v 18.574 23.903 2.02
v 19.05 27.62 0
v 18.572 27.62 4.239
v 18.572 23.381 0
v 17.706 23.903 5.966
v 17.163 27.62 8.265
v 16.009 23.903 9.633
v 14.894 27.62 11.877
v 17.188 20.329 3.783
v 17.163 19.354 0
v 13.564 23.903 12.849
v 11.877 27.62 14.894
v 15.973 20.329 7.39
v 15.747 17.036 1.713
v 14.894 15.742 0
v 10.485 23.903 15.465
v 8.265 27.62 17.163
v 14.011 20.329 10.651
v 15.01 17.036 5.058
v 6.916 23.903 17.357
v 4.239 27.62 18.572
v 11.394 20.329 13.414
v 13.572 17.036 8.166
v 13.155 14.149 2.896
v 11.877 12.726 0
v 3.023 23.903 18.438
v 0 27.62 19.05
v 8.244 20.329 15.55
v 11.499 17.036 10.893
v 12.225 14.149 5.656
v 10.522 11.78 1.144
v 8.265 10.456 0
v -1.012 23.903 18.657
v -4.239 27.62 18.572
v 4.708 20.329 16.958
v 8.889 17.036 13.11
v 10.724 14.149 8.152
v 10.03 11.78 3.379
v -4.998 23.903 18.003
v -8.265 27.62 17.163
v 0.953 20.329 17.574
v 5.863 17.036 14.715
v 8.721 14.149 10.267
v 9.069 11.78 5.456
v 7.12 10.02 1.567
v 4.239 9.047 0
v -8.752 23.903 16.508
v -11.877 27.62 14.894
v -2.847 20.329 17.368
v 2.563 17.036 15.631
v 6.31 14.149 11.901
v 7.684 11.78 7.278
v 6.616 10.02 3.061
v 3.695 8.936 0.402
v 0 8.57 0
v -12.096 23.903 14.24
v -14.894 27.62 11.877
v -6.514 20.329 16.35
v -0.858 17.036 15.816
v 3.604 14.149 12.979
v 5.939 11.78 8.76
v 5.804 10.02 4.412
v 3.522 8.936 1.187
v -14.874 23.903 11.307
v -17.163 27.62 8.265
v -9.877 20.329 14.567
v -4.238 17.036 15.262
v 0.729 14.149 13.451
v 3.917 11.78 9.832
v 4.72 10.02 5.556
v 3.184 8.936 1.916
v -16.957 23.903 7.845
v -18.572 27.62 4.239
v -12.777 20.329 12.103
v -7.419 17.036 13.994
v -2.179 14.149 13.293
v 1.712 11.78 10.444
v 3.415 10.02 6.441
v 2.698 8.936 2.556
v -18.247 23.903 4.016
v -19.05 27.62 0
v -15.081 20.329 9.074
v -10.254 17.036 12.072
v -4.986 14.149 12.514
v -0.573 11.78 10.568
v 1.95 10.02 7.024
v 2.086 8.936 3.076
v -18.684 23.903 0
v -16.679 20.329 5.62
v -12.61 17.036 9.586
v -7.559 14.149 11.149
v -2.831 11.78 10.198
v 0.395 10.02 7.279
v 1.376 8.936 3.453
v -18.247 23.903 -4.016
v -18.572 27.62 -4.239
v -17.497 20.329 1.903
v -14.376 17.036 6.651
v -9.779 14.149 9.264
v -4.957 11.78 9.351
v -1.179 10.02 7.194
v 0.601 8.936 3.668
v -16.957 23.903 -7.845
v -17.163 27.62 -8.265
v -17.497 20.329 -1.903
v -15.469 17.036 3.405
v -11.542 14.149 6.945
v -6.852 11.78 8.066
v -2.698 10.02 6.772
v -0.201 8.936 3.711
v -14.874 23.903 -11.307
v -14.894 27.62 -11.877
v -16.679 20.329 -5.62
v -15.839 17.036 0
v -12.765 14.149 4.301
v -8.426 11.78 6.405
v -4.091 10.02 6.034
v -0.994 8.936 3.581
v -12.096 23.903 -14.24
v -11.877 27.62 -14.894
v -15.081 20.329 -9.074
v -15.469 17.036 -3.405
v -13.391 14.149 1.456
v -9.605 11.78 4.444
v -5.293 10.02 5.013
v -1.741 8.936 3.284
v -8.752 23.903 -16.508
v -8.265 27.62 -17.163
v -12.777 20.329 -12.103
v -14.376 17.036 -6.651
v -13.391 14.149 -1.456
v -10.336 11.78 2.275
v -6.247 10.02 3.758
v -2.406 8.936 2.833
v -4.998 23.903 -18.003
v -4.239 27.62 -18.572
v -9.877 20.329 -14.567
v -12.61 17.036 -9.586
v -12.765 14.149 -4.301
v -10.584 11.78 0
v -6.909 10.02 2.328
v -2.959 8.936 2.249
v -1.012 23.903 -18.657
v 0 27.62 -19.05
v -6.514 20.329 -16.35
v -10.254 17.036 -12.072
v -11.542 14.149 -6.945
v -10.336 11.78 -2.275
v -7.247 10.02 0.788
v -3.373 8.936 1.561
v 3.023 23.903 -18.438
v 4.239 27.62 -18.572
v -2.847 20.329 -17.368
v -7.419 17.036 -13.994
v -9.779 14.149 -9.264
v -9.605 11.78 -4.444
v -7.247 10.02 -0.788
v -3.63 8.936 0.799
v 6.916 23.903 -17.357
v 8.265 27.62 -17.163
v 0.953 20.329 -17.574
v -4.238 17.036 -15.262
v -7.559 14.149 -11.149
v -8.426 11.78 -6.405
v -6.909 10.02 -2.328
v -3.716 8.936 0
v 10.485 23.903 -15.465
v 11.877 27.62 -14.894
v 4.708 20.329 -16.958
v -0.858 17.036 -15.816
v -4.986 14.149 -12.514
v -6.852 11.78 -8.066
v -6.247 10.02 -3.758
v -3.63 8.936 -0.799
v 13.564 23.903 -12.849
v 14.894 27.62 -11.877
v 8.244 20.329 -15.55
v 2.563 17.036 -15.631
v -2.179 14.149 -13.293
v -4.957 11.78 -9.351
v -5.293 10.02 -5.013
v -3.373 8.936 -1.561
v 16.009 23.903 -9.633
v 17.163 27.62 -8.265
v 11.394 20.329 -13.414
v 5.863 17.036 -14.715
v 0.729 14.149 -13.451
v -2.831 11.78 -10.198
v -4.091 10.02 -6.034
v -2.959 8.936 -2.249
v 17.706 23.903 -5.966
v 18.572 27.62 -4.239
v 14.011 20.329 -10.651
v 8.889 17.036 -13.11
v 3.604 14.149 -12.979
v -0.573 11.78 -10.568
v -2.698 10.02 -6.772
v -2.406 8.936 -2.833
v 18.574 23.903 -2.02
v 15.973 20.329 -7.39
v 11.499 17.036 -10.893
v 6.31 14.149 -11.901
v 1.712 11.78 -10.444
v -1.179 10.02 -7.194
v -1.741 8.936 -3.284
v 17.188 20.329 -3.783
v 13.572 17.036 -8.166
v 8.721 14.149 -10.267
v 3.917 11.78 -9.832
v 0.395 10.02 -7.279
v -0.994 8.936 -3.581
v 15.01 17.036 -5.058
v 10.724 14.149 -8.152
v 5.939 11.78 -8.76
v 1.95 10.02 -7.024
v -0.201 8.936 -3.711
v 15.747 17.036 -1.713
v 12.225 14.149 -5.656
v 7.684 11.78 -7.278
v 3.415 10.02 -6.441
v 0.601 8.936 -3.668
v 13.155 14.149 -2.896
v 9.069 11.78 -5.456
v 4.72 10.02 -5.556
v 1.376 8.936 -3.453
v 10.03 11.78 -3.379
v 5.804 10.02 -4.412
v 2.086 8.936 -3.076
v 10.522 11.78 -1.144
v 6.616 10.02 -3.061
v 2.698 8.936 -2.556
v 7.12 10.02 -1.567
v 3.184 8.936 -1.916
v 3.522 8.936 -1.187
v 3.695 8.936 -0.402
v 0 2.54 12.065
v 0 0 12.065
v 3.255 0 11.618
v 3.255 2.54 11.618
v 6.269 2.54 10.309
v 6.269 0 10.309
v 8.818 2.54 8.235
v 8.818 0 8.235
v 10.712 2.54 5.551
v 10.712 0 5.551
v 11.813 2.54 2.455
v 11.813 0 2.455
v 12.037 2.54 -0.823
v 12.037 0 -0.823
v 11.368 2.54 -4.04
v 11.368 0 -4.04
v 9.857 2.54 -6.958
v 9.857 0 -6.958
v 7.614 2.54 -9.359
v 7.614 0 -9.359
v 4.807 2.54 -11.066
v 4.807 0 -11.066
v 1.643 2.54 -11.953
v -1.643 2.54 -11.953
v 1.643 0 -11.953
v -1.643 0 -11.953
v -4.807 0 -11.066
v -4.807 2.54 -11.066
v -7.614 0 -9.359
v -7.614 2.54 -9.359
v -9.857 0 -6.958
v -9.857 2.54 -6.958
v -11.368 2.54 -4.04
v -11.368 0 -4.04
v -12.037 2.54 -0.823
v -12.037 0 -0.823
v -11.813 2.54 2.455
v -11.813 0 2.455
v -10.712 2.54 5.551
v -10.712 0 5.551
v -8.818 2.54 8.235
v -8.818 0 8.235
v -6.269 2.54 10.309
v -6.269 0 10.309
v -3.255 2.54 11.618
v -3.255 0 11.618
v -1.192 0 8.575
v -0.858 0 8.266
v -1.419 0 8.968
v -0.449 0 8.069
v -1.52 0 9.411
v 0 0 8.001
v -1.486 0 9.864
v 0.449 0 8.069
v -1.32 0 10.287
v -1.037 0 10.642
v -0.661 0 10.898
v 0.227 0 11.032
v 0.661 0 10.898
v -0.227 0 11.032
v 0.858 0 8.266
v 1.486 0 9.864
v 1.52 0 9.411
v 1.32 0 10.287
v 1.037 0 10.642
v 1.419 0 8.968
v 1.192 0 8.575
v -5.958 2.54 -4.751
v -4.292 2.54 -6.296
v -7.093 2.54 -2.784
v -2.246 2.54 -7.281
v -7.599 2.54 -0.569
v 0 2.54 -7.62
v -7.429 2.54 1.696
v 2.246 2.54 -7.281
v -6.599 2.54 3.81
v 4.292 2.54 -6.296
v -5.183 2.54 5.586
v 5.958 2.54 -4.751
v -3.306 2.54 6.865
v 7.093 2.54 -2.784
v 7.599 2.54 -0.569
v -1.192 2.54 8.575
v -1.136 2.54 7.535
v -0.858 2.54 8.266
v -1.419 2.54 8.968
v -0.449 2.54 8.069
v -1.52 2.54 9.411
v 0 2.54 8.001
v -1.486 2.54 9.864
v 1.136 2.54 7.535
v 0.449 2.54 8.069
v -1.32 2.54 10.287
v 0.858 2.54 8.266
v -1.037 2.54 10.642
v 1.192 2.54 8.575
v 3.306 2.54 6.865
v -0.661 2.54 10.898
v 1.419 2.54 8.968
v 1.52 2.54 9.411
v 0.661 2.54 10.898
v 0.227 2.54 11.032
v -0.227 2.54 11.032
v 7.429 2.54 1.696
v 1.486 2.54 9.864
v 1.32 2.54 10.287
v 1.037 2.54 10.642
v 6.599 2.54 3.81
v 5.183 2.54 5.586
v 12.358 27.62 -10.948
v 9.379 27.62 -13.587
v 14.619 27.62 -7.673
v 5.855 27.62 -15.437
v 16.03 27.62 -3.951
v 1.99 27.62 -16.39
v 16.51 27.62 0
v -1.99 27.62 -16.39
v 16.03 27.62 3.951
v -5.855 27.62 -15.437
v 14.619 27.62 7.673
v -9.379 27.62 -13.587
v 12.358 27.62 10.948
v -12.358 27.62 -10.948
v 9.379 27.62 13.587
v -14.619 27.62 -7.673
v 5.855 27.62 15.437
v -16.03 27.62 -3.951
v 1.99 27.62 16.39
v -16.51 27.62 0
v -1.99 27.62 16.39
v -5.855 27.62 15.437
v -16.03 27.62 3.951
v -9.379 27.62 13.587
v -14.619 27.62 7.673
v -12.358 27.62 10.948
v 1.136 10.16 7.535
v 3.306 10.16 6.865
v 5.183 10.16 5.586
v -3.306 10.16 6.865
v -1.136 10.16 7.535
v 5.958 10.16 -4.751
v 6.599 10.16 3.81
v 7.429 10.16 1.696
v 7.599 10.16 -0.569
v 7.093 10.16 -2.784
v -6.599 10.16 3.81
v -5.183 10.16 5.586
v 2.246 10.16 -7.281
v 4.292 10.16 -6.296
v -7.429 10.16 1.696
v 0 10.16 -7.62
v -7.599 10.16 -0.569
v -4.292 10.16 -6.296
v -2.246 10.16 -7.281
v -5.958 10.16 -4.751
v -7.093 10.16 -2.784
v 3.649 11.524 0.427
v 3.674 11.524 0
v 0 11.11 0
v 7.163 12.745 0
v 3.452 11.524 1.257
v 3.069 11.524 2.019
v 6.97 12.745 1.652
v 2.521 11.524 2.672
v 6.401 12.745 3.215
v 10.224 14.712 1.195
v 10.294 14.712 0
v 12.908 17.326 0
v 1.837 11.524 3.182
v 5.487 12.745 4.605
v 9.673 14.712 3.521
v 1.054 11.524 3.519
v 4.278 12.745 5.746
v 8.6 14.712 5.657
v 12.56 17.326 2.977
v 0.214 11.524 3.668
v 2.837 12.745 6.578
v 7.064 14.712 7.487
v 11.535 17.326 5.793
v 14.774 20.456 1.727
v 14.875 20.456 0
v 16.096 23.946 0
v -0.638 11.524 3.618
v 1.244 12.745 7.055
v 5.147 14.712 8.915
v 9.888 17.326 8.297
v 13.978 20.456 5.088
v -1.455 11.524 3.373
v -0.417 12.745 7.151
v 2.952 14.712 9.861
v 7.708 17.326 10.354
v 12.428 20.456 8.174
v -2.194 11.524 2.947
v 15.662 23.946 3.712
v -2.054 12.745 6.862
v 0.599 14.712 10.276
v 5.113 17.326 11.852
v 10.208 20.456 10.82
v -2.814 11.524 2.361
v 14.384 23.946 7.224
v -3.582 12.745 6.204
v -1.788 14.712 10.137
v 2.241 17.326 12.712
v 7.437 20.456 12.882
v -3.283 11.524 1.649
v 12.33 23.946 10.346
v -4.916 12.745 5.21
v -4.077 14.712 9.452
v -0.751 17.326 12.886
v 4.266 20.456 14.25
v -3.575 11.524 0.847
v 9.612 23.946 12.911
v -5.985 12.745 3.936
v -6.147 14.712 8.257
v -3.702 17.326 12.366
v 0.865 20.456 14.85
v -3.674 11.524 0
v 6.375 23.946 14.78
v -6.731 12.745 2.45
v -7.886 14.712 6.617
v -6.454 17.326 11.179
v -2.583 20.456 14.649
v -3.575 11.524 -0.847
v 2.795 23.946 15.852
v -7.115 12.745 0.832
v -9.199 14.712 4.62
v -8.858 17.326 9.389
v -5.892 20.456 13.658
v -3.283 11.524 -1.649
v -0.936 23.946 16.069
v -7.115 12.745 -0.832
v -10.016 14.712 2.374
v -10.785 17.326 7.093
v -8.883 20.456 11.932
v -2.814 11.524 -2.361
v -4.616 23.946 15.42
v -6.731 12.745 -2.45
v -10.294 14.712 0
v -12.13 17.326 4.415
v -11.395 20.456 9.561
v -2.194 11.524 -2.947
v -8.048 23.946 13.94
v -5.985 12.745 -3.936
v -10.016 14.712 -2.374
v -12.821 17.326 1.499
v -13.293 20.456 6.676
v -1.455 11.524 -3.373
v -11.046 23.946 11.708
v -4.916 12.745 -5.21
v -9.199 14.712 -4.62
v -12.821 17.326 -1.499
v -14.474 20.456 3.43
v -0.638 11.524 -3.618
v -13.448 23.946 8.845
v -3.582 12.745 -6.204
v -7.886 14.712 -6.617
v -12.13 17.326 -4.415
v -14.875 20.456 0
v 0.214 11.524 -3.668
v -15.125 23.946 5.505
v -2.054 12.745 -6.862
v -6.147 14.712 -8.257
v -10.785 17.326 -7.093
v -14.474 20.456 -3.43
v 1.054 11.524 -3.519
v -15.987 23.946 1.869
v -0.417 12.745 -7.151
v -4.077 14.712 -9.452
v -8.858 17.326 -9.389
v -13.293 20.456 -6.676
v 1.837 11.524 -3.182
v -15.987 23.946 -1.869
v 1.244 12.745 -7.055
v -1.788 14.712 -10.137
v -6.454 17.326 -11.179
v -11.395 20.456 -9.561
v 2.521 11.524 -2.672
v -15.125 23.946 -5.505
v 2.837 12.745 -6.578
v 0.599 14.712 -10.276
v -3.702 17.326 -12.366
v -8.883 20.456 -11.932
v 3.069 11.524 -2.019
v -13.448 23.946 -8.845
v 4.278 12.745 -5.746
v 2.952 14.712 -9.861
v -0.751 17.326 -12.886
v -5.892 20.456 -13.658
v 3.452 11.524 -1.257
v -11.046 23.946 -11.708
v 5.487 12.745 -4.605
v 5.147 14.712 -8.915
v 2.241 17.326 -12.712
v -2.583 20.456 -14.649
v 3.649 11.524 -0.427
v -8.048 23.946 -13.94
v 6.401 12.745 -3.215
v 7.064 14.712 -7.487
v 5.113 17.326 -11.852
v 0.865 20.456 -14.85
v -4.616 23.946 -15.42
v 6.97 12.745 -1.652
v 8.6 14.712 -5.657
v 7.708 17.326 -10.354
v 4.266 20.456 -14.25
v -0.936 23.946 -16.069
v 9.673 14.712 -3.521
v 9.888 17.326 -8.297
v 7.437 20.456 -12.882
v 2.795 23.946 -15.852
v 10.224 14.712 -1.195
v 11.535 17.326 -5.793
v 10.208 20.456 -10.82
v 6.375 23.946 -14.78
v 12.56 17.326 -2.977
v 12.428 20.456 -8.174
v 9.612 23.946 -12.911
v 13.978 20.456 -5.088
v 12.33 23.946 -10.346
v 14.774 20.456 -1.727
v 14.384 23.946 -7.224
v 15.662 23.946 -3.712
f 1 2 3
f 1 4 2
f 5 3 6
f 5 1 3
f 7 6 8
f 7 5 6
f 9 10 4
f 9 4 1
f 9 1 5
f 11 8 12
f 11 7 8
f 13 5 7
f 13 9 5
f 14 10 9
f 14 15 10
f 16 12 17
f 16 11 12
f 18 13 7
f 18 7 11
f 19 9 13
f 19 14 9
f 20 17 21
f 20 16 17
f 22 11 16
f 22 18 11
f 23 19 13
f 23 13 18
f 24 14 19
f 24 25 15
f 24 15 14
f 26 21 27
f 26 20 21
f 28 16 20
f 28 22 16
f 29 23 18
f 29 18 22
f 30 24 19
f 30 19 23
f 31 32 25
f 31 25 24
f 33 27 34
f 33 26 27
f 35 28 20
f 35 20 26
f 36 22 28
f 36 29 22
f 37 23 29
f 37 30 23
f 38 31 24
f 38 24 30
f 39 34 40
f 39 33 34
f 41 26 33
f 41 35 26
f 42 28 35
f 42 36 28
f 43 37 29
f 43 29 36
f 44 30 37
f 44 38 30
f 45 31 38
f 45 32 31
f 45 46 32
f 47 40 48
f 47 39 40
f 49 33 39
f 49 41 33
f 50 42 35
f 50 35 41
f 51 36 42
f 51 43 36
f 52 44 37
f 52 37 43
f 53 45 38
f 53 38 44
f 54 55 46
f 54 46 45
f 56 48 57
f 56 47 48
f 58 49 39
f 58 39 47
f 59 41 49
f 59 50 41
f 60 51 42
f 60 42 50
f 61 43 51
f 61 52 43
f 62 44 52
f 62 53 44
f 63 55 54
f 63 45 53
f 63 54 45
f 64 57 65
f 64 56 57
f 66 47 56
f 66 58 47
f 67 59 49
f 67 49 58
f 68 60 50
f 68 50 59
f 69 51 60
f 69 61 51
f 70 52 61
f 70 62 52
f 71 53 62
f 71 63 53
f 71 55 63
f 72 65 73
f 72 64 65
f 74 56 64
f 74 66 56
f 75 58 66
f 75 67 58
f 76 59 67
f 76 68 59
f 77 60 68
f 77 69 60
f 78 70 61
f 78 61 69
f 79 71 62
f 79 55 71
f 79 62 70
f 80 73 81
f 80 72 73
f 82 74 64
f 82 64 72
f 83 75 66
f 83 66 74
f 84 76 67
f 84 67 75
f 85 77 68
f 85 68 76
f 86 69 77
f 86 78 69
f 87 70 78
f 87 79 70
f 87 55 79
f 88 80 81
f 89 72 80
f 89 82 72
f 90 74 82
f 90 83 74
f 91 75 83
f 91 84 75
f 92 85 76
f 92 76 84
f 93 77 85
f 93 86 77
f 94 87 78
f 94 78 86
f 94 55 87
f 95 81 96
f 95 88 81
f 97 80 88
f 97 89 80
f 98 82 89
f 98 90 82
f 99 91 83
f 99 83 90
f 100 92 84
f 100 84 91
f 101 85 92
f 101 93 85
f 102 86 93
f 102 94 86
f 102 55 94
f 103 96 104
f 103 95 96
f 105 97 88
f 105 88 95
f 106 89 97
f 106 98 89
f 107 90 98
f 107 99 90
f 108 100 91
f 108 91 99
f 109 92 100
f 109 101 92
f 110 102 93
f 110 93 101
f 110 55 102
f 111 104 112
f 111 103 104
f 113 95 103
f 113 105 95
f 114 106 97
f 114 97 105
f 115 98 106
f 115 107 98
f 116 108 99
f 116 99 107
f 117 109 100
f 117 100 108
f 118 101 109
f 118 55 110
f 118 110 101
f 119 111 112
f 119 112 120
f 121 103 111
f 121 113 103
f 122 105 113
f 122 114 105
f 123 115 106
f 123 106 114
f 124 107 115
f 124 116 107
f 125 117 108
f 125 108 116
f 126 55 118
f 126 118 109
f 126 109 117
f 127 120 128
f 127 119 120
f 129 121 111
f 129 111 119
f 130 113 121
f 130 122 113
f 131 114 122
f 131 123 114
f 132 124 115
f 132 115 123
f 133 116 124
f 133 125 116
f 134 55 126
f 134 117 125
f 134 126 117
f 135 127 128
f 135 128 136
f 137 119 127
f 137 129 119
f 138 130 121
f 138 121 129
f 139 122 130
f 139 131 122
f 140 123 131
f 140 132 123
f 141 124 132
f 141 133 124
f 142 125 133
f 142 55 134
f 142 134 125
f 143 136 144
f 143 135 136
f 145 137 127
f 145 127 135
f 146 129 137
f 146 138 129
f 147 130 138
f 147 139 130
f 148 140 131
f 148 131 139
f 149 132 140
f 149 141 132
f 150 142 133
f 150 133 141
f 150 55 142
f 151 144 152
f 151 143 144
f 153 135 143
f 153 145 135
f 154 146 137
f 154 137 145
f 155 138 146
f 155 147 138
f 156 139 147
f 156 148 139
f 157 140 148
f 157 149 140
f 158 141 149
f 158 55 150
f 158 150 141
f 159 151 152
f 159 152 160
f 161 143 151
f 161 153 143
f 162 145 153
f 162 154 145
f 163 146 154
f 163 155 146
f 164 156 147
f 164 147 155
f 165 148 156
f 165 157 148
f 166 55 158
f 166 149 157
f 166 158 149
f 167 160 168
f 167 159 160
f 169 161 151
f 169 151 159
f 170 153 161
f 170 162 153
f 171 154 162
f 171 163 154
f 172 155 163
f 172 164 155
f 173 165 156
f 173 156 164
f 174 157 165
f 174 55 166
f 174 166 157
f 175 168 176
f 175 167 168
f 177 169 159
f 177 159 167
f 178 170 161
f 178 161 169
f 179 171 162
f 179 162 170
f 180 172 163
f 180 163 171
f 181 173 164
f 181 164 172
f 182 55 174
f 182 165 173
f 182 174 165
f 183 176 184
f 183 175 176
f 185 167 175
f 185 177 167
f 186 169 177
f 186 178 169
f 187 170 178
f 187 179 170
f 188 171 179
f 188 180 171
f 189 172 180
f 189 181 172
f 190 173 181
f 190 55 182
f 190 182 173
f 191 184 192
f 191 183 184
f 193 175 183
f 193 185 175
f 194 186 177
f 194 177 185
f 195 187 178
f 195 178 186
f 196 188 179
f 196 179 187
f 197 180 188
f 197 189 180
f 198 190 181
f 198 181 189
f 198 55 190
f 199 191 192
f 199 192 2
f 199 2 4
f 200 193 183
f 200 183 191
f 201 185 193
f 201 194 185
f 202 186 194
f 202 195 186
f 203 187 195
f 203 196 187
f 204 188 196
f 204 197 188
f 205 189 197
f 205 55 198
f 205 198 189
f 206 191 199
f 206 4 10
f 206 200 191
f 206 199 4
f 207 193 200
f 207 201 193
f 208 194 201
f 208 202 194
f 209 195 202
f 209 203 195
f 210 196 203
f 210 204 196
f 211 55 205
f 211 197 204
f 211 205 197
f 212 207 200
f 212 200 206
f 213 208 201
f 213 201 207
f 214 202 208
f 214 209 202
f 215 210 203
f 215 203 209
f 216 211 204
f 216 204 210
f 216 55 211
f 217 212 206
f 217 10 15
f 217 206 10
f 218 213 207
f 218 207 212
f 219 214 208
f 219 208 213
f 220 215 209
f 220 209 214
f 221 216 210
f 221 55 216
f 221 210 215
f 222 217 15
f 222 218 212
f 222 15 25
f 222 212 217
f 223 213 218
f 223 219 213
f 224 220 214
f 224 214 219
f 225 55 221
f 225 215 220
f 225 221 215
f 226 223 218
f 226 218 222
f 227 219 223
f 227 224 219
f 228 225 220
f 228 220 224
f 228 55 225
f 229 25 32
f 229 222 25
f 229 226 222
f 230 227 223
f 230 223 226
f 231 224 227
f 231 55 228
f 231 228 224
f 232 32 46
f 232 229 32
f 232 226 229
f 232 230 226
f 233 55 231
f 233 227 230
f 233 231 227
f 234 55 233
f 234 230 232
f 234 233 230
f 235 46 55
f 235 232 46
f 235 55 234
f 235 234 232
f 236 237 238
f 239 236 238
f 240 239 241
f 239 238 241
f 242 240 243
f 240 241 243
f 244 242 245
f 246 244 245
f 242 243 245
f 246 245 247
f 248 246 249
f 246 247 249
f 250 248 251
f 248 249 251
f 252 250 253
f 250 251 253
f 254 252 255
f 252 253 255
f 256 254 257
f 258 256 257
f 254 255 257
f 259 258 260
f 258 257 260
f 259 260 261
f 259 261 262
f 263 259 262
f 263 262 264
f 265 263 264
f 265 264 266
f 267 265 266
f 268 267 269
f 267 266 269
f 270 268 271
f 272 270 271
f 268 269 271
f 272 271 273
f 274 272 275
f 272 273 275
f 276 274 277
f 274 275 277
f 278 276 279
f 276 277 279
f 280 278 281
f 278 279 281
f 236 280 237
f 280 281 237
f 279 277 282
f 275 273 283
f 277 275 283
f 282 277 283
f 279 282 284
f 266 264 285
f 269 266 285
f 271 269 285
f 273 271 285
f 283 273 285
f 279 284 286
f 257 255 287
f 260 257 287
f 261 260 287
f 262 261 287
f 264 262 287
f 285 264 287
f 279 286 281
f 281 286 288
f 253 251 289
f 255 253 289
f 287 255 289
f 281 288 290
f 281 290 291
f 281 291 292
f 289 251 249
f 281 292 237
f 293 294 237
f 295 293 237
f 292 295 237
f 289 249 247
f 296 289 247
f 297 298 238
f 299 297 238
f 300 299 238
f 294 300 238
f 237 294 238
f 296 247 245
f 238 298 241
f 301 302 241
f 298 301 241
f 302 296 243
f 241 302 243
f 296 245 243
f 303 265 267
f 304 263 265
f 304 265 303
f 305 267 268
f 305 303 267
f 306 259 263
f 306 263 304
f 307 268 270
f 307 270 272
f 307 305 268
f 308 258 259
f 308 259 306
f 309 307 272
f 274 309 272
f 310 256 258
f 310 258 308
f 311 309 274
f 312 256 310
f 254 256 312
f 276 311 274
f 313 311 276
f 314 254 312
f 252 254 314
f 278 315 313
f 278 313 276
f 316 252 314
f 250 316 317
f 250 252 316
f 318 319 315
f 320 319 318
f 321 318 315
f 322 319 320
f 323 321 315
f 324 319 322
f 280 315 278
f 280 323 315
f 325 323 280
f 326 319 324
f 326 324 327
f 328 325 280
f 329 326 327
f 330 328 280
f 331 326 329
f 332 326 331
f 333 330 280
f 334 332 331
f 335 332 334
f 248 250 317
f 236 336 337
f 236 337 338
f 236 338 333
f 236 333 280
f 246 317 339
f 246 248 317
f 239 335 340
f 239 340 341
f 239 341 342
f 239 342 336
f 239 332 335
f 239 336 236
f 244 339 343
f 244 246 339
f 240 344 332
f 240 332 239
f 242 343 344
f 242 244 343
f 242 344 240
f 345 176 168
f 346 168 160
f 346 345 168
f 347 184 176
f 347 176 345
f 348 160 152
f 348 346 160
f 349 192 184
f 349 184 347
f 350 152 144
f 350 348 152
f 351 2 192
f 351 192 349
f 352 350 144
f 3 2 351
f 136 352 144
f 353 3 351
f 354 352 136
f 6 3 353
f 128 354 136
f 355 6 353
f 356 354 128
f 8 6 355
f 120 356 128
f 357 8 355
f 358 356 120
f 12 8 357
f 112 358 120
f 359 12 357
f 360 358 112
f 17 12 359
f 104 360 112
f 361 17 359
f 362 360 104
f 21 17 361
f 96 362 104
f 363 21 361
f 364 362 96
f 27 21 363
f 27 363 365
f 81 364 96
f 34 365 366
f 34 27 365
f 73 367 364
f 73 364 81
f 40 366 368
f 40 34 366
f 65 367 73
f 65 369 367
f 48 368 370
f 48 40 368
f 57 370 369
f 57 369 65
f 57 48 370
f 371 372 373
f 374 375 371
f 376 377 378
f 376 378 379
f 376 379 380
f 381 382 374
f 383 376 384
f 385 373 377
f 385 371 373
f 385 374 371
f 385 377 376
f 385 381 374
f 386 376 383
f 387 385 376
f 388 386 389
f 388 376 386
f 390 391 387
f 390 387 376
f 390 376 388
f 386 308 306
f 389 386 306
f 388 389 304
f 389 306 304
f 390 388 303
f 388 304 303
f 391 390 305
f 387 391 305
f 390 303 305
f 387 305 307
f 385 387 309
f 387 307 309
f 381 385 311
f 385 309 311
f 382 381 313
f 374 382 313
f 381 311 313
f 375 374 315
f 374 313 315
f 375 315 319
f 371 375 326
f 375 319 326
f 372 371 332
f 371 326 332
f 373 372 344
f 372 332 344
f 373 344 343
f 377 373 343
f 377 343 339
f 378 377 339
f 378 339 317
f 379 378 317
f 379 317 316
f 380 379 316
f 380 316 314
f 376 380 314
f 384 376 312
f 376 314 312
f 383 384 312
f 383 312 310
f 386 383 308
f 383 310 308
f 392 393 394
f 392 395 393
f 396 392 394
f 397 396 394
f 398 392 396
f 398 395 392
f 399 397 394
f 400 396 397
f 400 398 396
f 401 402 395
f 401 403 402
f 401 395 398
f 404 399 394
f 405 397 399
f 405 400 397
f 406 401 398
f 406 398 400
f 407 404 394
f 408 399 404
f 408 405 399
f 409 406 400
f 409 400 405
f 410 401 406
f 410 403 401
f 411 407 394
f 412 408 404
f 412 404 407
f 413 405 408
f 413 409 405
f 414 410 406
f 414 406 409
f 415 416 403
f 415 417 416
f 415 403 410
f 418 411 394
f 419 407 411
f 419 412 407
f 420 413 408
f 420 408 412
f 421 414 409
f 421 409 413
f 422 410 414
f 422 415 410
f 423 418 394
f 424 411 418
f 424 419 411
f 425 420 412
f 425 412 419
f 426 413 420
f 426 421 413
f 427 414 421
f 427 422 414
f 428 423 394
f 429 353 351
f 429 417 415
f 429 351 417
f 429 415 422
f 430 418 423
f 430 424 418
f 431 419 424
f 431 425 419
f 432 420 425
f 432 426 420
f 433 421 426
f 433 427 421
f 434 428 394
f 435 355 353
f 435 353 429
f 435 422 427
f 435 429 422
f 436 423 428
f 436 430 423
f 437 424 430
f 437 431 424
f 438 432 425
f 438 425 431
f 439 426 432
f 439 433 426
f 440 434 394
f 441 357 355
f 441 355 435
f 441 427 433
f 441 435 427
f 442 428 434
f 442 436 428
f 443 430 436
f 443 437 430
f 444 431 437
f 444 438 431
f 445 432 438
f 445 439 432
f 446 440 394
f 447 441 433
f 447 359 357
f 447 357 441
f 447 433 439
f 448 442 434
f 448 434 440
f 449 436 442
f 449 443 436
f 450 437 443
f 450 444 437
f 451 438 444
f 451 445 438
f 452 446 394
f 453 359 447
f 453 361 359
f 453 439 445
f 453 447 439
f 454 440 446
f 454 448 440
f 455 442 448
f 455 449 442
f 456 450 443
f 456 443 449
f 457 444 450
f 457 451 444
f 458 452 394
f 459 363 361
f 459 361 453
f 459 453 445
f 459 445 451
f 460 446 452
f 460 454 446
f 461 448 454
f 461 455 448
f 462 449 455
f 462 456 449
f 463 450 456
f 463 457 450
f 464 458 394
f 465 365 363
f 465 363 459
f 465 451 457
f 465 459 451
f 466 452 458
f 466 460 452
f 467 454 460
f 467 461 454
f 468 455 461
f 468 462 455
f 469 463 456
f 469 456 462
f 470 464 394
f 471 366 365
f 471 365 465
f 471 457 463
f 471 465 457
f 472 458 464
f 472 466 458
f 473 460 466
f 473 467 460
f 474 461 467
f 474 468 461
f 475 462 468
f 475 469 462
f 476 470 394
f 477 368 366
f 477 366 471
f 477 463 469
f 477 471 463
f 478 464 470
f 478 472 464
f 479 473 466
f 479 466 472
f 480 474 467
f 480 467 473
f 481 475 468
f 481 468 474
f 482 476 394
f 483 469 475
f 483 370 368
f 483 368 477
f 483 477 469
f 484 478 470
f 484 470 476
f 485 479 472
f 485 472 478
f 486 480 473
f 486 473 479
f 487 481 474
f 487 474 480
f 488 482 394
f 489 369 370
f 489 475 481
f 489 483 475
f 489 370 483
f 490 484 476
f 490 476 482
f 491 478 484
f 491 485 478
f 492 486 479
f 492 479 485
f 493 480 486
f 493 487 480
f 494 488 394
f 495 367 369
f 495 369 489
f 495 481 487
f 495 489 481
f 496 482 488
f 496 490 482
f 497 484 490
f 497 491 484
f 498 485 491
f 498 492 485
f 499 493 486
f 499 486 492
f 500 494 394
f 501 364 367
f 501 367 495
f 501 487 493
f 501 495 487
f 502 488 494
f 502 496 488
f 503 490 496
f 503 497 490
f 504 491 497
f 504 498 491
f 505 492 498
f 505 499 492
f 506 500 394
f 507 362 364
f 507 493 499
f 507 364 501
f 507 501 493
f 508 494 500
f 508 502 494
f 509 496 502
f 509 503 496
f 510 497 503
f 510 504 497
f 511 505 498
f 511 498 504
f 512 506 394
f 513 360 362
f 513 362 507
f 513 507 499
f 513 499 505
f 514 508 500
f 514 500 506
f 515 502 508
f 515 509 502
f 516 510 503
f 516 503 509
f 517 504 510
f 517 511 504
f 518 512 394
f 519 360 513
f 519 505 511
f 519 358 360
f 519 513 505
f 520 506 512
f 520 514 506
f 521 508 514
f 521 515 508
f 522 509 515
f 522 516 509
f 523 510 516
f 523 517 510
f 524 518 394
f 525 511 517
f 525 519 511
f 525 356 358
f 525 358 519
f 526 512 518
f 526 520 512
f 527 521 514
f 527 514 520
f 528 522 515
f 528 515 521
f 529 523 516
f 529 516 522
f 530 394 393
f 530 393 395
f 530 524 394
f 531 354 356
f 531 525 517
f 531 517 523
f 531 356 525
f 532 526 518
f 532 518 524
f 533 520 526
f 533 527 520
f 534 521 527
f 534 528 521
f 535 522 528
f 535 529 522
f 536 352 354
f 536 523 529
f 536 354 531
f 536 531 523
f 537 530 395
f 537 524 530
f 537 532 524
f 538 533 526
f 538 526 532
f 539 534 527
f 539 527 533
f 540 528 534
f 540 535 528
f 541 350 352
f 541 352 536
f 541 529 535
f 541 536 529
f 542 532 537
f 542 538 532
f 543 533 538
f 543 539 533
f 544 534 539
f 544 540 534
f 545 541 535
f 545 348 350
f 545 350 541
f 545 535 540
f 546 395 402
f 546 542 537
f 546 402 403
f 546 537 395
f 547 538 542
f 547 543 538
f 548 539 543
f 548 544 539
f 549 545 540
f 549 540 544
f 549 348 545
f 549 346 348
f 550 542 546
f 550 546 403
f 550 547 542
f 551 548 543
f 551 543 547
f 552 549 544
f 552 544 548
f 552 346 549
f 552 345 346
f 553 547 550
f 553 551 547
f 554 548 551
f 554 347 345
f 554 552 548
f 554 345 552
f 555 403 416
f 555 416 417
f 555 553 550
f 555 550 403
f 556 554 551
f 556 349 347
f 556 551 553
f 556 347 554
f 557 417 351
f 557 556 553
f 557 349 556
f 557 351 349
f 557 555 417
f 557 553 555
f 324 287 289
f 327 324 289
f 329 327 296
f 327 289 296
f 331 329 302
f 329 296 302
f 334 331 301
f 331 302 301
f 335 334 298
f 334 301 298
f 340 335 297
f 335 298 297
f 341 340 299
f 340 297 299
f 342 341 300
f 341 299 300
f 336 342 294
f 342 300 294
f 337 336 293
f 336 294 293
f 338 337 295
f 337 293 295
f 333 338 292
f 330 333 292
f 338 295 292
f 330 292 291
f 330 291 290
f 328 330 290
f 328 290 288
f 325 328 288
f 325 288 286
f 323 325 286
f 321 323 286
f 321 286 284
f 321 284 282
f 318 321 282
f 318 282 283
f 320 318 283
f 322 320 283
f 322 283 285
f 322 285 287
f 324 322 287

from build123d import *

# Parameters (mm, degrees)
SKETCH2_R           = 12.065
BOSS_EXTRUDE1_DEPTH = 2.54
SKETCH3_R           = 7.62
BOSS_EXTRUDE2_DEPTH = 7.62
SKETCH6_R           = 1.524
CUT_EXTRUDE1_DEPTH  = 5.08


with BuildPart() as part:
    # Sketch2 → Boss-Extrude1 (new body)
    with BuildSketch(Plane(origin=(0, 0, 0), x_dir=(1, 0, 0), z_dir=(0, 1, 0))):
        with Locations(Location((0, 0, 0), (0, 0, 270))):
            Circle(SKETCH2_R)
    extrude(amount=BOSS_EXTRUDE1_DEPTH)

    # Sketch3 → Boss-Extrude2 (add)
    with BuildSketch(Plane(origin=(0, 2.54, 0), x_dir=(1, 0, 0), z_dir=(0, 1, 0))):
        with Locations(Location((0, 0, 0), (0, 0, 90))):
            Circle(SKETCH3_R)
    extrude(amount=BOSS_EXTRUDE2_DEPTH)

    # Sketch6 → Cut-Extrude1 (cut)
    with BuildSketch(Plane.XZ):
        with Locations(Location((0, 9.525, 0), (0, 0, 270))):
            Circle(SKETCH6_R)
    extrude(amount=-CUT_EXTRUDE1_DEPTH, mode=Mode.SUBTRACT)


with BuildPart() as body_2:
    # Sketch5 → Revolve1 (revolve)
    with BuildSketch(Plane.XY):
        with BuildLine():
            Line((16.51, 27.619613398), (19.05, 27.619613398))
            ThreePointArc((19.05, 27.619613398), (13.470384182, 14.149229216), (0, 8.569613398))
            Line((0, 8.569613398), (0, 11.109613398))
            ThreePointArc((0, 11.109613398), (11.674332957, 15.94528044), (16.51, 27.619613398))
        make_face()
    revolve(axis=Axis((0, 47.87511184, 0), (0, -1, 0)))


solid = Compound([part.part, body_2.part])
